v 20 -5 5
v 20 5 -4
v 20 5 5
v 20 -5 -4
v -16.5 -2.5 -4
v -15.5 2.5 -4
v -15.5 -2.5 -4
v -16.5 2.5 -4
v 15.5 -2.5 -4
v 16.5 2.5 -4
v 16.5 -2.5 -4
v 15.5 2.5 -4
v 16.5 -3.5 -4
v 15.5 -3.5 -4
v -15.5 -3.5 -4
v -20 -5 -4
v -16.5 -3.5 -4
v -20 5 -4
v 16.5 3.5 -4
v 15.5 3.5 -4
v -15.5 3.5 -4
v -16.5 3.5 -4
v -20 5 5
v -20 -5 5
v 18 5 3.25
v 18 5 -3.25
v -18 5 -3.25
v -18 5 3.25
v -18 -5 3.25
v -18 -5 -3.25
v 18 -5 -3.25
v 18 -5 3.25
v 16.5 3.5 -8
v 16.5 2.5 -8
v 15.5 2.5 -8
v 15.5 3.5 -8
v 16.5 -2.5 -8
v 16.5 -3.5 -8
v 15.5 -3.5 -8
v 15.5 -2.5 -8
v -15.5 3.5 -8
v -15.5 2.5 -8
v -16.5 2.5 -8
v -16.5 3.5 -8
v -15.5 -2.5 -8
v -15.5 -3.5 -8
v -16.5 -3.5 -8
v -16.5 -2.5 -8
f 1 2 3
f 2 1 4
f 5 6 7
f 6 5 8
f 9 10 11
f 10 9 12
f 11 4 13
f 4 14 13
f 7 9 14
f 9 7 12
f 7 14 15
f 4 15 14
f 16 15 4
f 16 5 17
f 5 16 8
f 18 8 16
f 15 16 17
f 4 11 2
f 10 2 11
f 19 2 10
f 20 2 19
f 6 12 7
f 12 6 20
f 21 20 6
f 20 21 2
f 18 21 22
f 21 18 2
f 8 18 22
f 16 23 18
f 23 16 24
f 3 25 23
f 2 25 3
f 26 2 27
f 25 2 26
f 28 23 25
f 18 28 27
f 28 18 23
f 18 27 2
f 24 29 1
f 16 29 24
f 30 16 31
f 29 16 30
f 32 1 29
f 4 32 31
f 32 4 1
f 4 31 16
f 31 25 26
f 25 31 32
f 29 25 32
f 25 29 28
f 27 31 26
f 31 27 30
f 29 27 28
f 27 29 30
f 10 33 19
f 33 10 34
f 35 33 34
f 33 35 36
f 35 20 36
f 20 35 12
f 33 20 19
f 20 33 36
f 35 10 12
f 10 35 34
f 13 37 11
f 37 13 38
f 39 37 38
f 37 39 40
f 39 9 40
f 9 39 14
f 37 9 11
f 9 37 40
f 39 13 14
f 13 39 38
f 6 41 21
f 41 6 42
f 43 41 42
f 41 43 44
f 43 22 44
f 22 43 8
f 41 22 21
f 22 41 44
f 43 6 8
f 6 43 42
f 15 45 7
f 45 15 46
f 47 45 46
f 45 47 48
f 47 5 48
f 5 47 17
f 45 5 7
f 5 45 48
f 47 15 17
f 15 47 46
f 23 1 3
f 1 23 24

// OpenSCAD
module Table_02(){

    color("#986931")
    translate([0,0,4.5]){
    cube([40,6,1], center =true);
    }

    color("#36220b")
    translate([0,4,4.5]){
    cube([40,2,1], center =true);
    }

    color("#36220b")
    translate([0,-4,4.5]){
    cube([40,2,1], center =true);
    }

    color("#5e3e17")
    difference(){
        cube([40,10,8], center =true);
        cube([36,12,6.5], center =true);
    }

    color("#1a1818"){
        translate([16,3,-6]){
        cube([1,1,4], center =true);
        }

        translate([16,-3,-6]){
        cube([1,1,4], center =true);
        }

        translate([-16,3,-6]){
        cube([1,1,4], center =true);
        }

        translate([-16,-3,-6]){
        cube([1,1,4], center =true);
        }

    }

}

Table_02();

// Written by Nicolì Angelo (Gengio) 2024: 
// MIT License

//Permission is hereby granted, free of charge, to any person obtaining a copy of this software and associated documentation files (the "Software"), to deal in the Software without restriction, including without limitation the rights to use, copy, modify, merge, publish, distribute, sublicense, and/or sell copies of the Software, and to permit persons to whom the Software is furnished to do so, subject to the following conditions:

//The above copyright notice and this permission notice shall be included in all copies or substantial portions of the Software.

//THE SOFTWARE IS PROVIDED "AS IS", WITHOUT WARRANTY OF ANY KIND, EXPRESS OR IMPLIED, INCLUDING BUT NOT LIMITED TO THE WARRANTIES OF MERCHANTABILITY, FITNESS FOR A PARTICULAR PURPOSE AND NONINFRINGEMENT. IN NO EVENT SHALL THE AUTHORS OR COPYRIGHT HOLDERS BE LIABLE FOR ANY CLAIM, DAMAGES OR OTHER LIABILITY, WHETHER IN AN ACTION OF CONTRACT, TORT OR OTHERWISE, ARISING FROM, OUT OF OR IN CONNECTION WITH THE SOFTWARE OR THE USE OR OTHER DEALINGS IN THE SOFTWARE.
